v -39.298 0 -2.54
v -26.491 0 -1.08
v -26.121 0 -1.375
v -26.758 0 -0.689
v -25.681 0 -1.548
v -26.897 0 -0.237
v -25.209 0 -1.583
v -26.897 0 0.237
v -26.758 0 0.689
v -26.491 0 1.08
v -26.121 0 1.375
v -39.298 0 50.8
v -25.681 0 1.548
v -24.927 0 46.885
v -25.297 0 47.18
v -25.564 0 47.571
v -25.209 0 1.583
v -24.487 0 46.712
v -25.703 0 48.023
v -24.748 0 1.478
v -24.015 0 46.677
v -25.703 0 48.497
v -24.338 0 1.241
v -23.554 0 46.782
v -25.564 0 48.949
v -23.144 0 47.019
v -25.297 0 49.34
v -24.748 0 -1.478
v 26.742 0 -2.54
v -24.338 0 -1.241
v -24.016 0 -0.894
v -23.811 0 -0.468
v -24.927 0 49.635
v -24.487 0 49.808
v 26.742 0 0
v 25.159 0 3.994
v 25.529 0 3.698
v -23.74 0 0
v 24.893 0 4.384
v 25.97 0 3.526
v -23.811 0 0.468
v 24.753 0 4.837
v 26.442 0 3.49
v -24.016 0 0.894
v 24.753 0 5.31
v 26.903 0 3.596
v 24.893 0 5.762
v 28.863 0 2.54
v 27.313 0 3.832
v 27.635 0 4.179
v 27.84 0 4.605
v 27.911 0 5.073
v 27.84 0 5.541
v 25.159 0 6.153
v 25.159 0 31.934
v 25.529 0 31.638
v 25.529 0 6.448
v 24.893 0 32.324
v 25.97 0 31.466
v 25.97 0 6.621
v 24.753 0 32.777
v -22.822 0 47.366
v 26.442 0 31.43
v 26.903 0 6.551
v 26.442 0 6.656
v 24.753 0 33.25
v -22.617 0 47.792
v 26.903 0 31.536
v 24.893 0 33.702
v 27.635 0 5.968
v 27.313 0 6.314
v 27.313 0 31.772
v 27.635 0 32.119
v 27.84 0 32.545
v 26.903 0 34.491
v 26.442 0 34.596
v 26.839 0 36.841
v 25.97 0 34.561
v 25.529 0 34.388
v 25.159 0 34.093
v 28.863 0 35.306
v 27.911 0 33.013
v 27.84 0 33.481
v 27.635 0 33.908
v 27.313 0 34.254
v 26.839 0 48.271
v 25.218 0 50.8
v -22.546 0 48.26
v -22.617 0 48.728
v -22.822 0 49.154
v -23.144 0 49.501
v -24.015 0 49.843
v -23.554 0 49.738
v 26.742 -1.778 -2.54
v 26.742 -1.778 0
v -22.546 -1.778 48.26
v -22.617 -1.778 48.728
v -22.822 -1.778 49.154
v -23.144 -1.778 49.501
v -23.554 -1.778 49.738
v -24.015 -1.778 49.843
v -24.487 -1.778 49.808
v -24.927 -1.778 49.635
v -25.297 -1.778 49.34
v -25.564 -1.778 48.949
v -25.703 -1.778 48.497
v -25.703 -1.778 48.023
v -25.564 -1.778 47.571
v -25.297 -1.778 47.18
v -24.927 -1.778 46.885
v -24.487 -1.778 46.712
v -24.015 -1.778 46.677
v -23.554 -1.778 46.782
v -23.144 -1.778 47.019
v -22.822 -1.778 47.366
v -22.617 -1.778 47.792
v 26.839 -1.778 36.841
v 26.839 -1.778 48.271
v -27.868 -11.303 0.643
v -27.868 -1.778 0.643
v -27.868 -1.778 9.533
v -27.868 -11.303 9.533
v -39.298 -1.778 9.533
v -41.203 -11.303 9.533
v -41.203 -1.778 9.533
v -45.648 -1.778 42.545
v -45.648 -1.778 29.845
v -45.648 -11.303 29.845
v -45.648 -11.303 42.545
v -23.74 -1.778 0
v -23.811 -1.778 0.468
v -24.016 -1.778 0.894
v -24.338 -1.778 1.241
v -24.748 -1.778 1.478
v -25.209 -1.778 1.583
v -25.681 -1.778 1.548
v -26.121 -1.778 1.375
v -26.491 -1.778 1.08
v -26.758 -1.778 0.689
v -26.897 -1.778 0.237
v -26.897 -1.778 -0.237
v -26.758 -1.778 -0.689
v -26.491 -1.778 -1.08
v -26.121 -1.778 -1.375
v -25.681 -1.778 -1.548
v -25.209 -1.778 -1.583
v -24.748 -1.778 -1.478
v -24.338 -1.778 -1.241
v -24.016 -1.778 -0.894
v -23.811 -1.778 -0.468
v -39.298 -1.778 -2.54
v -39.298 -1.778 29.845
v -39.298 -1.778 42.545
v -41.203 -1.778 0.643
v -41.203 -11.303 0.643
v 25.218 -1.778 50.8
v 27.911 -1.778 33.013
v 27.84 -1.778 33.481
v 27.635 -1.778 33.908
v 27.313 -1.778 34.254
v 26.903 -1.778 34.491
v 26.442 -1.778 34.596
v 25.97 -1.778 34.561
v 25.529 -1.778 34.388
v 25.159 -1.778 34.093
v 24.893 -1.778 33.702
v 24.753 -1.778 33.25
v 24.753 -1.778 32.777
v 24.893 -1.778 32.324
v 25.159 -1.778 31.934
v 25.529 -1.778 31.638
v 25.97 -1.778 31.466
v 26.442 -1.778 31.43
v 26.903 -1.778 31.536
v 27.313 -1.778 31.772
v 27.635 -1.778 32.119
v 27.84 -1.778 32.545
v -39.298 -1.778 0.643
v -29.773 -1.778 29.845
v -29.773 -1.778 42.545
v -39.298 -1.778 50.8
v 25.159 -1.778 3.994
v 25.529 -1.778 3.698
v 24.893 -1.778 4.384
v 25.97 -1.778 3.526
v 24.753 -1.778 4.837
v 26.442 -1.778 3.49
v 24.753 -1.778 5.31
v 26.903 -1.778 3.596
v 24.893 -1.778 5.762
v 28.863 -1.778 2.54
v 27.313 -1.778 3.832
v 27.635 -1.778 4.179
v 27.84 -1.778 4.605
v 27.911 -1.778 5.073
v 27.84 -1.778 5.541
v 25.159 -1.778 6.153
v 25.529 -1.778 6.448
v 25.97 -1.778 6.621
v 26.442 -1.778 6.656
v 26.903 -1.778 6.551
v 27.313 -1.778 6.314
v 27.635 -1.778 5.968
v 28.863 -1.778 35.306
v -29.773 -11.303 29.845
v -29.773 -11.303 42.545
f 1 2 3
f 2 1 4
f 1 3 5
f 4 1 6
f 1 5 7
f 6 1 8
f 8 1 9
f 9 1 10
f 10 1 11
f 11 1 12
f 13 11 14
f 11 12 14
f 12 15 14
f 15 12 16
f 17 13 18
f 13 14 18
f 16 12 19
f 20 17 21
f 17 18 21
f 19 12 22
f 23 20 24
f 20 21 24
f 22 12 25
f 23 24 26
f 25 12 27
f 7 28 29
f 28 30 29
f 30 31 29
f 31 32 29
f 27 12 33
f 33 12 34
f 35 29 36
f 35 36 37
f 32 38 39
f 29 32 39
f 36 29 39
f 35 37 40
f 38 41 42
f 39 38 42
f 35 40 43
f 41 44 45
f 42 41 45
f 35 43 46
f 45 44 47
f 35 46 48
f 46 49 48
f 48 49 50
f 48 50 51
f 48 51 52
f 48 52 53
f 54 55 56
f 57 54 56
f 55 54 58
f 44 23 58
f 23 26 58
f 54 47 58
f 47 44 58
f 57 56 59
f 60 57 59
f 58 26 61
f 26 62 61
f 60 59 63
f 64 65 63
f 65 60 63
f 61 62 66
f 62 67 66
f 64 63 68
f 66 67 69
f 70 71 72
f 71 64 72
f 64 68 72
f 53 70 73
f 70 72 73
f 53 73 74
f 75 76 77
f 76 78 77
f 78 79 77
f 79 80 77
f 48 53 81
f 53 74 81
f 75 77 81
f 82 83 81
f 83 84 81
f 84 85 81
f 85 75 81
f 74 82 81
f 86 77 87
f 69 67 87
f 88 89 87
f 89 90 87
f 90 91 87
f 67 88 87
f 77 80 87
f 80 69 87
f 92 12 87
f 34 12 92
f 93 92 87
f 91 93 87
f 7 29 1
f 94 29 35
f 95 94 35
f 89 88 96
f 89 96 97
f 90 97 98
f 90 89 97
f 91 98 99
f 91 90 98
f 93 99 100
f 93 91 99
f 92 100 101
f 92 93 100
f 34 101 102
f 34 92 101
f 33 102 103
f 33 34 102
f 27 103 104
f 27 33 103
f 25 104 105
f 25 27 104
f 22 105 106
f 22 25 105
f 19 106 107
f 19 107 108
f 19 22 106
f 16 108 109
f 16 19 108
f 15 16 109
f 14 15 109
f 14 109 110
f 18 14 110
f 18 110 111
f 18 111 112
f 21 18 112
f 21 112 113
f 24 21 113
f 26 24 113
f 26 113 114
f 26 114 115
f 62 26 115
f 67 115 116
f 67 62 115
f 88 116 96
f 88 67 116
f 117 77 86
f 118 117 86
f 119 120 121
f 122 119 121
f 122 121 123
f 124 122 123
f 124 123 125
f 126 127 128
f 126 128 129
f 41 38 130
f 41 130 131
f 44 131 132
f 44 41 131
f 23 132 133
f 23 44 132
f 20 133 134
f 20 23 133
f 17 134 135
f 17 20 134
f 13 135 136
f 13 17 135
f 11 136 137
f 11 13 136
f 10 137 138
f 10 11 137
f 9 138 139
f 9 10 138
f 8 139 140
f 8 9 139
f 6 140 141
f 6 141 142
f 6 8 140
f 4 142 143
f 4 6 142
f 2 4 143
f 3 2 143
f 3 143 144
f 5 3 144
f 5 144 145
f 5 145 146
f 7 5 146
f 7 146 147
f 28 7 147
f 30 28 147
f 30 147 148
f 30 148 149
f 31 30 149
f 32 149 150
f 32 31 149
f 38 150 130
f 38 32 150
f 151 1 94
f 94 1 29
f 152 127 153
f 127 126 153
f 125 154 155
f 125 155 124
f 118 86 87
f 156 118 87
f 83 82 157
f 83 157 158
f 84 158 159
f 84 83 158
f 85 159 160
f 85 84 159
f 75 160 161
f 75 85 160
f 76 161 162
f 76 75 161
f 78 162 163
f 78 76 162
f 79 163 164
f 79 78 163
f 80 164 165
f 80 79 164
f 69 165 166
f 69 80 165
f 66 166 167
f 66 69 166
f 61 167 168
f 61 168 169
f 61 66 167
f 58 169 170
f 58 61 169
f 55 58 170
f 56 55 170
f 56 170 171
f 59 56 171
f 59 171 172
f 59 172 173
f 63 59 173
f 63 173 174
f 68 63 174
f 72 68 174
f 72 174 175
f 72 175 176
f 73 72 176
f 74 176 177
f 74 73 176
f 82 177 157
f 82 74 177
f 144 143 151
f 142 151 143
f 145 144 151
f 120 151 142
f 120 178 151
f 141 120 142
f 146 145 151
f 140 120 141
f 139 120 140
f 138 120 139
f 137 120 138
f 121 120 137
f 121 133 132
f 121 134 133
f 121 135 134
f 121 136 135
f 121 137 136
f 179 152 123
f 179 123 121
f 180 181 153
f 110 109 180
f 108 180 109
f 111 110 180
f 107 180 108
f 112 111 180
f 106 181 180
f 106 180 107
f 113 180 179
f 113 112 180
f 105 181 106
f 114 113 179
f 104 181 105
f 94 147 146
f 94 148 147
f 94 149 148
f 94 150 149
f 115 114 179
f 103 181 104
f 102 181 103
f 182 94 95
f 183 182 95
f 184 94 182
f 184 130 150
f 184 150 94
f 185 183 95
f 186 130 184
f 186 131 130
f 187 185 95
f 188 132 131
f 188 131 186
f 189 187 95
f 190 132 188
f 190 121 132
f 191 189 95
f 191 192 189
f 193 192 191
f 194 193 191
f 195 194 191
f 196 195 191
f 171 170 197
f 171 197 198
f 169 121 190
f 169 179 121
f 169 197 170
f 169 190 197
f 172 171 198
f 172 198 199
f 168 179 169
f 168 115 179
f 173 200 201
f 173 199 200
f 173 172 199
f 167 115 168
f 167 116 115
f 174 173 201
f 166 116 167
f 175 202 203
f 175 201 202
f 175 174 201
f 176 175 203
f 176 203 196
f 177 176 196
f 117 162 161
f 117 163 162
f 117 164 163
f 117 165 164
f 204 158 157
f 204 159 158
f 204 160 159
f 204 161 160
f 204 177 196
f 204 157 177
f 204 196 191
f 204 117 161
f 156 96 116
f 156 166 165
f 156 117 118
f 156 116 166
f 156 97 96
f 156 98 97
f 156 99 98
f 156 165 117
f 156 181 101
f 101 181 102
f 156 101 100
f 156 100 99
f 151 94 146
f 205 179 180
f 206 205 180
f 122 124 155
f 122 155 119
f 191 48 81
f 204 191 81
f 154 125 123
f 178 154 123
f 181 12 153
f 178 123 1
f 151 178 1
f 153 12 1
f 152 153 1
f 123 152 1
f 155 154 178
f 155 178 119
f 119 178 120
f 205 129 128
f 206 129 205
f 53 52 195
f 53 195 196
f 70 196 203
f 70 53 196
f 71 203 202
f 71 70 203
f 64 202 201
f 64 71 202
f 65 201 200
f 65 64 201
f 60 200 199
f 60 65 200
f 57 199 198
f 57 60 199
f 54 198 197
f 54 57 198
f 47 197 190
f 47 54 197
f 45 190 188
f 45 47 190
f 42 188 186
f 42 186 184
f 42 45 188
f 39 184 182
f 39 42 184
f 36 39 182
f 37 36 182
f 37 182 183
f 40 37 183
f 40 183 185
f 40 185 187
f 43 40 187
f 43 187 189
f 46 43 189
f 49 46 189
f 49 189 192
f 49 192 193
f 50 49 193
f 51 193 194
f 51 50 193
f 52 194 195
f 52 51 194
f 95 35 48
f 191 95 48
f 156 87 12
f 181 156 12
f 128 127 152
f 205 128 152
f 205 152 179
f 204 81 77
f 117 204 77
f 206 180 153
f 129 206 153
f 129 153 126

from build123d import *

# Parameters (mm, degrees)
F0_R     = 1.5875
F1_DEPTH = 1.778
F2_W     = 9.525
F2_H     = 12.7
F2_W_2   = 6.35
F3_DEPTH = 9.525
F2_W_3   = 1.905
F2_H_2   = 8.89
F2_W_4   = 11.43
F4_DEPTH = 9.525


with BuildPart() as f1:
    # F0 (on Front) → F1 (new body)
    with BuildSketch(Plane.XZ):
        Polygon((25.218356, 50.8), (-39.297644, 50.8), (-39.297644, -2.54), (26.742356, -2.54), (26.742356, 0), (28.862767, 2.54), (28.862767, 35.306), (26.838946, 36.840845), (26.838946, 48.270845), align=None)
        with Locations((-25.327644, 0)):
            Circle(F0_R, mode=Mode.SUBTRACT)
        with Locations((26.323122, 5.073287)):
            Circle(F0_R, mode=Mode.SUBTRACT)
        with Locations((-24.133679, 48.26)):
            Circle(F0_R, mode=Mode.SUBTRACT)
        with Locations((26.323122, 33.013287)):
            Circle(F0_R, mode=Mode.SUBTRACT)
    extrude(amount=F1_DEPTH)

    # F2 (on face) → F3 (join)
    with BuildSketch(Plane.XZ.offset(1.778)):
        with Locations((-34.535144, 36.195)):
            Rectangle(F2_W, F2_H)
        with Locations((-42.472644, 36.195)):
            Rectangle(F2_W_2, F2_H)
    extrude(amount=F3_DEPTH)

    # F2 (on face) → F4 (join)
    with BuildSketch(Plane.XZ.offset(1.778)):
        with Locations((-40.250144, 5.088352)):
            Rectangle(F2_W_3, F2_H_2)
        with Locations((-33.582644, 5.088352)):
            Rectangle(F2_W_4, F2_H_2)
    extrude(amount=F4_DEPTH)


solid = f1.part
